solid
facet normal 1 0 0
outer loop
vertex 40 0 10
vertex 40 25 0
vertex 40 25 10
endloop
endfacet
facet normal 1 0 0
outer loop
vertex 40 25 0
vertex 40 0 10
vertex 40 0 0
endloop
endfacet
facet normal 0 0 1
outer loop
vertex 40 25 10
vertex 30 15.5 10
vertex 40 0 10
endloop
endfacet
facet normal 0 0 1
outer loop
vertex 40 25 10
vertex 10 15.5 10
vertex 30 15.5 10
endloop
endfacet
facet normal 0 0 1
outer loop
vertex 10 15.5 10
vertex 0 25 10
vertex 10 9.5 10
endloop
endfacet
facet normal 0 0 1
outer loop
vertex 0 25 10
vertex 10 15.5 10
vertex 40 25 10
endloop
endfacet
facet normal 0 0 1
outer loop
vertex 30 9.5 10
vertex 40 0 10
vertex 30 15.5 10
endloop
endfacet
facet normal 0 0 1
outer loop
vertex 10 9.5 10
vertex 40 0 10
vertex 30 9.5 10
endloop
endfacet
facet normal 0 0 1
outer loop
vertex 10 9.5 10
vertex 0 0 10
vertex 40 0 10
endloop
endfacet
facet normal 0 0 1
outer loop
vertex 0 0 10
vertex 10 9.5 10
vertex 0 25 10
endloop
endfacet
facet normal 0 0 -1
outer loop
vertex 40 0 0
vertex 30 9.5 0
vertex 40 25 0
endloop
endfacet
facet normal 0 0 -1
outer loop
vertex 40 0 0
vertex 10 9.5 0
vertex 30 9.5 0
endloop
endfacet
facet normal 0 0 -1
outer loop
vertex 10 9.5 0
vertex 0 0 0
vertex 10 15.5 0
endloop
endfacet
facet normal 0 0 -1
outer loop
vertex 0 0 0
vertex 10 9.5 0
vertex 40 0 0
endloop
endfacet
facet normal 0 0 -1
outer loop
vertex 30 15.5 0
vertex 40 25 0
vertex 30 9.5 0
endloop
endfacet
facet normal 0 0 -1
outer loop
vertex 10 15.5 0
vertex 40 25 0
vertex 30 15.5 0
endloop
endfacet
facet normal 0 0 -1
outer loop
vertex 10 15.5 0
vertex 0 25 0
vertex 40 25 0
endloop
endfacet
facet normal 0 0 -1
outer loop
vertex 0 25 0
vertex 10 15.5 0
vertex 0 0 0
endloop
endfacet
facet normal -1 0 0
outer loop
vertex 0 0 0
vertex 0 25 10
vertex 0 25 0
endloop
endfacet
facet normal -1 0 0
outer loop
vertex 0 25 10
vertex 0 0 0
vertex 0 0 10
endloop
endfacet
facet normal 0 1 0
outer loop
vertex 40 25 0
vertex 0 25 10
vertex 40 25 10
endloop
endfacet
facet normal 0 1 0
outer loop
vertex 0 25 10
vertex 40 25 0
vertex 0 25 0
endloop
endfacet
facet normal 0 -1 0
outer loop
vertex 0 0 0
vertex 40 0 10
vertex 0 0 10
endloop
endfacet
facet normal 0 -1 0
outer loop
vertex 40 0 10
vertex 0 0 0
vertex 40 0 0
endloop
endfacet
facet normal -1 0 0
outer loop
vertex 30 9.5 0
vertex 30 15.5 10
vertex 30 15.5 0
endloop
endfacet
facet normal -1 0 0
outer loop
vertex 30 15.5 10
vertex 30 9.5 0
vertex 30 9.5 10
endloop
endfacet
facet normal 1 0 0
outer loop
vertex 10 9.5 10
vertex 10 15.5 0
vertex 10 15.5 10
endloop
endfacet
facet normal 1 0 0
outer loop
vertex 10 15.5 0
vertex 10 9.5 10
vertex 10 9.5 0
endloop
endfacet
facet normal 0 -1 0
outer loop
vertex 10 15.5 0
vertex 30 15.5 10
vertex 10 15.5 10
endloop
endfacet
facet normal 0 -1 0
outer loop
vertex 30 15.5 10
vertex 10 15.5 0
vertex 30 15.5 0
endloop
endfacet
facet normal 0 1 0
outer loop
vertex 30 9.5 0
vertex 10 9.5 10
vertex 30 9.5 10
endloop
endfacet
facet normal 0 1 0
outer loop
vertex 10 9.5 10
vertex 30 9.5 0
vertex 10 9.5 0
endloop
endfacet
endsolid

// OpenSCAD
module tensioner_block() {
  difference() {
    cube([40.0, 25.0, 10.0], center=false);
    translate([10.0, 9.5, -1]) cube([20.0, 6.0, 12.0], center=false);
    translate([20.0, 12.5, -1]) cylinder(h=12.0, d=5.2, center=false);
  }
}
tensioner_block();
